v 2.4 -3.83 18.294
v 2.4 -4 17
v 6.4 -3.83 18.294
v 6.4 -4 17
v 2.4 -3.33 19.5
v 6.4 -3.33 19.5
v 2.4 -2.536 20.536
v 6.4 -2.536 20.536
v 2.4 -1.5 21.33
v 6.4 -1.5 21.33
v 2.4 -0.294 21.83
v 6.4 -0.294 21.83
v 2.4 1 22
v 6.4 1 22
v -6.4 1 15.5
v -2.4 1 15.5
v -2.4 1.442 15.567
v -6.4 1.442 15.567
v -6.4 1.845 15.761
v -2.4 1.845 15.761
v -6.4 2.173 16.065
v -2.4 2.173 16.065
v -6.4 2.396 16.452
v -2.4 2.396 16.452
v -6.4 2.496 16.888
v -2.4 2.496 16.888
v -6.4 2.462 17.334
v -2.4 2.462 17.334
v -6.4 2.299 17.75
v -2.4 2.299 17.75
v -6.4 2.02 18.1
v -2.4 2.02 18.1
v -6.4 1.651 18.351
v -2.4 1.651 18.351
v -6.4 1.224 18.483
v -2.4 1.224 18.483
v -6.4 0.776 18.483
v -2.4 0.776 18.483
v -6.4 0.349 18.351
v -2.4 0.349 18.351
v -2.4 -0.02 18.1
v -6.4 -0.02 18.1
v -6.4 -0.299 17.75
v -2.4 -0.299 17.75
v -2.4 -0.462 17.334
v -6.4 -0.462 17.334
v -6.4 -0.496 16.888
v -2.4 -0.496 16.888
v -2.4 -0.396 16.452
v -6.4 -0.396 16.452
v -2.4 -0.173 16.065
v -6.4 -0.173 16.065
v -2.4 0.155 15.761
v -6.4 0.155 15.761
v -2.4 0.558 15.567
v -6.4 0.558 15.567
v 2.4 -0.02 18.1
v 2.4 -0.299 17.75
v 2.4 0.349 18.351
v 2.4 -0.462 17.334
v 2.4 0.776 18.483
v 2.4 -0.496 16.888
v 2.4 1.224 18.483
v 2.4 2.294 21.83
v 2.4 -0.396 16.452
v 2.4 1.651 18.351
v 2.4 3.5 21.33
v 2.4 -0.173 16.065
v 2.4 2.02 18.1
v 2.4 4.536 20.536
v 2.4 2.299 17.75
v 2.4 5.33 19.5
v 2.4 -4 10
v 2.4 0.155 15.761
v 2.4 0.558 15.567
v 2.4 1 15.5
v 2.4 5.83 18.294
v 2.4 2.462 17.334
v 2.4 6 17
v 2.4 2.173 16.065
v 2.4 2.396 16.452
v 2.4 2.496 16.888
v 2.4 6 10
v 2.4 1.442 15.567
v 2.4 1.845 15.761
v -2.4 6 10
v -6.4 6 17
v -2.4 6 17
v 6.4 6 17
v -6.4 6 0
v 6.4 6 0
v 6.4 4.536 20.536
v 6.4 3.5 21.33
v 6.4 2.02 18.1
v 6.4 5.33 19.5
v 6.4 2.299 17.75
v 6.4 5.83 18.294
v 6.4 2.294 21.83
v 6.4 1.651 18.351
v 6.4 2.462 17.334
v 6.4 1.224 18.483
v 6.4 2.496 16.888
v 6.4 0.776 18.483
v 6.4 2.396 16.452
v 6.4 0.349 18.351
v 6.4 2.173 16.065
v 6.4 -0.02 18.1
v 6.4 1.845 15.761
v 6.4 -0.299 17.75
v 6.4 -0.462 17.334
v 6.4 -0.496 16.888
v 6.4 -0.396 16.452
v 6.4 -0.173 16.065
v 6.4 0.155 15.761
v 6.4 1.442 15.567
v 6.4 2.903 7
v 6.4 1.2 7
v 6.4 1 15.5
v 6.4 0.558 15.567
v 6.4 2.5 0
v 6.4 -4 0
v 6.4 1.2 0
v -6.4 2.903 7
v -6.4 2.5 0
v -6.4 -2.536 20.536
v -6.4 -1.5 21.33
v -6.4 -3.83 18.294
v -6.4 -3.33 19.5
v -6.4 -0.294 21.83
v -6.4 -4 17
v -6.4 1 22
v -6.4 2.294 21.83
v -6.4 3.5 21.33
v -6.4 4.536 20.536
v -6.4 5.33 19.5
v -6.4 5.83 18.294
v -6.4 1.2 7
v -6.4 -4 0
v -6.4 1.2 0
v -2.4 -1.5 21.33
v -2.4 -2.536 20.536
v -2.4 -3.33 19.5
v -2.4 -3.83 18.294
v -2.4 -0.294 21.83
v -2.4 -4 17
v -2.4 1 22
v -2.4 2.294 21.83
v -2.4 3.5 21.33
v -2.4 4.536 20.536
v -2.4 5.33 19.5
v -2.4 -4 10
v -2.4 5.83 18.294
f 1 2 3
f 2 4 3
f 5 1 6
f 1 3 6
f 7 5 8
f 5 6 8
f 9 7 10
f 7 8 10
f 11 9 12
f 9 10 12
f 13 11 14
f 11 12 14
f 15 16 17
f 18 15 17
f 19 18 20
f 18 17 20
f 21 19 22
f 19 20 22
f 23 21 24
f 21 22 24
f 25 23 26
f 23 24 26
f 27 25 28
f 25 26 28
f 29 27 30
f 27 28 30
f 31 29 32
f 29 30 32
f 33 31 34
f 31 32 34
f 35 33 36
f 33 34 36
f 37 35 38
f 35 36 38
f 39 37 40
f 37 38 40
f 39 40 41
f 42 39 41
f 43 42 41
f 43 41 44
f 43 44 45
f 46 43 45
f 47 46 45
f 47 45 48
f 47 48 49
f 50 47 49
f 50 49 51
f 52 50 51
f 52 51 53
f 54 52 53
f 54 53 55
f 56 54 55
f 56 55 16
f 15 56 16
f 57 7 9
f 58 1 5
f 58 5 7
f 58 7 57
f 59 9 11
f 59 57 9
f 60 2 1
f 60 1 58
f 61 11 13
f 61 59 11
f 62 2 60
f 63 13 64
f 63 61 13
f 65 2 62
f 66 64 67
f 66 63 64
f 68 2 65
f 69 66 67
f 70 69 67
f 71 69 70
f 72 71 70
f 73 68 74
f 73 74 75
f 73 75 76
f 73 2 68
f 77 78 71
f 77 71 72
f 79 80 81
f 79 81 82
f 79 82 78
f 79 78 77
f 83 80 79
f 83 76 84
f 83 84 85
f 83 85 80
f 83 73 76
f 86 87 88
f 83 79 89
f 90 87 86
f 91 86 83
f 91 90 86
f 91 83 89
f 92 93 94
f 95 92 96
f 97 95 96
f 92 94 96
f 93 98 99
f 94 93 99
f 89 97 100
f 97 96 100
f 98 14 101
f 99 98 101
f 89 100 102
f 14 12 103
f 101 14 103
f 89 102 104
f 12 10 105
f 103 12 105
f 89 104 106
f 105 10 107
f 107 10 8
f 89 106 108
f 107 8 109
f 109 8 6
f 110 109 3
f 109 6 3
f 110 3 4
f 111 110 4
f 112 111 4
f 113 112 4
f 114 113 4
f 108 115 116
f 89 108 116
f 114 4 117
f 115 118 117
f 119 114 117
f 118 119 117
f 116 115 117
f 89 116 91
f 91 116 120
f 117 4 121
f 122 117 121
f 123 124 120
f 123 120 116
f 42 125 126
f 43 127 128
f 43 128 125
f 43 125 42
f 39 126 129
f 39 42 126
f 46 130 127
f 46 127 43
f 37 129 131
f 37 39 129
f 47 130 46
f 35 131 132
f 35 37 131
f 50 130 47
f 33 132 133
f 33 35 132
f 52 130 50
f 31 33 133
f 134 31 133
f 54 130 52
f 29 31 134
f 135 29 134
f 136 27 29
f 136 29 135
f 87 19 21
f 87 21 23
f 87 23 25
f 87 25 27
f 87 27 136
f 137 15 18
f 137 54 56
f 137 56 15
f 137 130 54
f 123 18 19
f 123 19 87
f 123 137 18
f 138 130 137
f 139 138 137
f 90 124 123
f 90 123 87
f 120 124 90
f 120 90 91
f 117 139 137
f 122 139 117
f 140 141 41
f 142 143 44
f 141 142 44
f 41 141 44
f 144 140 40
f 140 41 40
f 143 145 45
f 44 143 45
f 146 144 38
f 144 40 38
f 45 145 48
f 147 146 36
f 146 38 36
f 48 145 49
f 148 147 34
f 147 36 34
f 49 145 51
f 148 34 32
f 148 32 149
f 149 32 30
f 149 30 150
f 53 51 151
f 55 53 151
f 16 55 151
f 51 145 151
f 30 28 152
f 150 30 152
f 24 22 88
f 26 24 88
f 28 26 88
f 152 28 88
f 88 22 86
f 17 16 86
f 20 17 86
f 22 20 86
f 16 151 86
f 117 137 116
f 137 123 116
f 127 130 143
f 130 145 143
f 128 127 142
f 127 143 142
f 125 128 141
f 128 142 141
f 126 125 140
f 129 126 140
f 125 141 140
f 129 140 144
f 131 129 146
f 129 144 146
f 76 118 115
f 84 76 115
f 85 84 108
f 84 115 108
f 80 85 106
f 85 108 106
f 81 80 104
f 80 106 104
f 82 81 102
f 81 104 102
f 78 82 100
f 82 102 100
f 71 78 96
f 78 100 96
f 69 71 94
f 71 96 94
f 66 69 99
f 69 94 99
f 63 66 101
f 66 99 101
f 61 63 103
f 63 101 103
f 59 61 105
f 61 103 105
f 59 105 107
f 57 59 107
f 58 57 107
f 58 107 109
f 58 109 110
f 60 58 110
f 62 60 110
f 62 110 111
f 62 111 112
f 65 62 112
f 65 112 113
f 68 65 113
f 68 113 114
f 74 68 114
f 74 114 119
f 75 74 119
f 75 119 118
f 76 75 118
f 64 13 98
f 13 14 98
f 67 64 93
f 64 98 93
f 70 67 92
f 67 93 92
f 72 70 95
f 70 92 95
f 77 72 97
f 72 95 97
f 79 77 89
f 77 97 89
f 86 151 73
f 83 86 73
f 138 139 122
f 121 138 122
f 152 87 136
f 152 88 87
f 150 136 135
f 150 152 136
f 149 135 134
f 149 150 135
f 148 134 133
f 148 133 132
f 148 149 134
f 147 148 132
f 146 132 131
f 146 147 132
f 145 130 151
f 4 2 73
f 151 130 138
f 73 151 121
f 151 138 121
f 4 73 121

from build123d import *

# Parameters (mm, degrees)
BOSS_EXTRUDE1_DEPTH = 10
SKETCH1_3_W         = 12.8
SKETCH1_3_H         = 1.3
BOSS_EXTRUDE2_DEPTH = 7
SKETCH1_5_W         = 12.8
SKETCH1_5_H         = 1.3
CUT_EXTRUDE1_DEPTH  = 7
SKETCH4_W           = 12.8
SKETCH4_H           = 10
BOSS_EXTRUDE3_DEPTH = 1
CUT_EXTRUDE3_DEPTH  = 15
SKETCH8_W           = 12.8
SKETCH8_H           = 10
BOSS_EXTRUDE4_DEPTH = 1
SKETCH10_W          = 4
SKETCH10_H          = 10
BOSS_EXTRUDE5_DEPTH = 12
FILLET1_R           = 5
HOLE1_D             = 3
HOLE1_DEPTH         = 100


with BuildPart() as part:
    # Sketch1 → Boss-Extrude1 (new body)
    with BuildSketch(Plane.XY):
        Polygon((6.4, 4), (-6.4, 4), (-6.4, -1), (-6.4, -4), (6.4, -4), (6.4, -1), align=None)
    extrude(amount=BOSS_EXTRUDE1_DEPTH)

    # Sketch1<3> → Boss-Extrude2 (add)
    with BuildSketch(Plane.XY):
        with Locations((0, 1.85)):
            Rectangle(SKETCH1_3_W, SKETCH1_3_H)
    extrude(amount=BOSS_EXTRUDE2_DEPTH)

    # Sketch1<5> → Cut-Extrude1 (cut)
    with BuildSketch(Plane.XY):
        with Locations((0, 1.85)):
            Rectangle(SKETCH1_5_W, SKETCH1_5_H)
    extrude(amount=CUT_EXTRUDE1_DEPTH, mode=Mode.SUBTRACT)

    # Sketch4 → Boss-Extrude3 (add)
    with BuildSketch(Plane(origin=(0, 4, 0), x_dir=(1, 0, 0), z_dir=(0, 1, 0))):
        with Locations((0, -5)):
            Rectangle(SKETCH4_W, SKETCH4_H)
    extrude(amount=BOSS_EXTRUDE3_DEPTH)

    # Sketch6 → Cut-Extrude3 (cut)
    with BuildSketch(Plane(origin=(6.4, 0, 0), x_dir=(0, 0, -1), z_dir=(1, 0, 0))):
        Polygon((0, 2.5), (-7, 2.902751688), (-7, 2.5), align=None)
    extrude(amount=-CUT_EXTRUDE3_DEPTH, mode=Mode.SUBTRACT)

    # Sketch8 → Boss-Extrude4 (add)
    with BuildSketch(Plane(origin=(0, 5, 0), x_dir=(1, 0, 0), z_dir=(0, 1, 0))):
        with Locations((0, -5)):
            Rectangle(SKETCH8_W, SKETCH8_H)
    extrude(amount=BOSS_EXTRUDE4_DEPTH)

    # Sketch10 → Boss-Extrude5 (add)
    with BuildSketch(Plane.XY.offset(10)):
        with Locations((-4.4, 1)):
            Rectangle(SKETCH10_W, SKETCH10_H)
        with Locations((4.4, 1)):
            Rectangle(SKETCH10_W, SKETCH10_H)
    extrude(amount=BOSS_EXTRUDE5_DEPTH)

    # Fillet1
    fillet1_edges = [part.edges().sort_by_distance(p)[0] for p in [
        (-4.4, -4, 22),
        (-4.4, 6, 22),
        (4.4, -4, 22),
        (4.4, 6, 22),
    ]]
    fillet(fillet1_edges, radius=FILLET1_R - 0.0001)  # a hair under: the kernel refuses the full size

    # Hole1
    with Locations(Plane.ZY.offset(6.4)):
        with Locations((17, 1)):
            Hole(HOLE1_D / 2, depth=HOLE1_DEPTH)


solid = part.part
